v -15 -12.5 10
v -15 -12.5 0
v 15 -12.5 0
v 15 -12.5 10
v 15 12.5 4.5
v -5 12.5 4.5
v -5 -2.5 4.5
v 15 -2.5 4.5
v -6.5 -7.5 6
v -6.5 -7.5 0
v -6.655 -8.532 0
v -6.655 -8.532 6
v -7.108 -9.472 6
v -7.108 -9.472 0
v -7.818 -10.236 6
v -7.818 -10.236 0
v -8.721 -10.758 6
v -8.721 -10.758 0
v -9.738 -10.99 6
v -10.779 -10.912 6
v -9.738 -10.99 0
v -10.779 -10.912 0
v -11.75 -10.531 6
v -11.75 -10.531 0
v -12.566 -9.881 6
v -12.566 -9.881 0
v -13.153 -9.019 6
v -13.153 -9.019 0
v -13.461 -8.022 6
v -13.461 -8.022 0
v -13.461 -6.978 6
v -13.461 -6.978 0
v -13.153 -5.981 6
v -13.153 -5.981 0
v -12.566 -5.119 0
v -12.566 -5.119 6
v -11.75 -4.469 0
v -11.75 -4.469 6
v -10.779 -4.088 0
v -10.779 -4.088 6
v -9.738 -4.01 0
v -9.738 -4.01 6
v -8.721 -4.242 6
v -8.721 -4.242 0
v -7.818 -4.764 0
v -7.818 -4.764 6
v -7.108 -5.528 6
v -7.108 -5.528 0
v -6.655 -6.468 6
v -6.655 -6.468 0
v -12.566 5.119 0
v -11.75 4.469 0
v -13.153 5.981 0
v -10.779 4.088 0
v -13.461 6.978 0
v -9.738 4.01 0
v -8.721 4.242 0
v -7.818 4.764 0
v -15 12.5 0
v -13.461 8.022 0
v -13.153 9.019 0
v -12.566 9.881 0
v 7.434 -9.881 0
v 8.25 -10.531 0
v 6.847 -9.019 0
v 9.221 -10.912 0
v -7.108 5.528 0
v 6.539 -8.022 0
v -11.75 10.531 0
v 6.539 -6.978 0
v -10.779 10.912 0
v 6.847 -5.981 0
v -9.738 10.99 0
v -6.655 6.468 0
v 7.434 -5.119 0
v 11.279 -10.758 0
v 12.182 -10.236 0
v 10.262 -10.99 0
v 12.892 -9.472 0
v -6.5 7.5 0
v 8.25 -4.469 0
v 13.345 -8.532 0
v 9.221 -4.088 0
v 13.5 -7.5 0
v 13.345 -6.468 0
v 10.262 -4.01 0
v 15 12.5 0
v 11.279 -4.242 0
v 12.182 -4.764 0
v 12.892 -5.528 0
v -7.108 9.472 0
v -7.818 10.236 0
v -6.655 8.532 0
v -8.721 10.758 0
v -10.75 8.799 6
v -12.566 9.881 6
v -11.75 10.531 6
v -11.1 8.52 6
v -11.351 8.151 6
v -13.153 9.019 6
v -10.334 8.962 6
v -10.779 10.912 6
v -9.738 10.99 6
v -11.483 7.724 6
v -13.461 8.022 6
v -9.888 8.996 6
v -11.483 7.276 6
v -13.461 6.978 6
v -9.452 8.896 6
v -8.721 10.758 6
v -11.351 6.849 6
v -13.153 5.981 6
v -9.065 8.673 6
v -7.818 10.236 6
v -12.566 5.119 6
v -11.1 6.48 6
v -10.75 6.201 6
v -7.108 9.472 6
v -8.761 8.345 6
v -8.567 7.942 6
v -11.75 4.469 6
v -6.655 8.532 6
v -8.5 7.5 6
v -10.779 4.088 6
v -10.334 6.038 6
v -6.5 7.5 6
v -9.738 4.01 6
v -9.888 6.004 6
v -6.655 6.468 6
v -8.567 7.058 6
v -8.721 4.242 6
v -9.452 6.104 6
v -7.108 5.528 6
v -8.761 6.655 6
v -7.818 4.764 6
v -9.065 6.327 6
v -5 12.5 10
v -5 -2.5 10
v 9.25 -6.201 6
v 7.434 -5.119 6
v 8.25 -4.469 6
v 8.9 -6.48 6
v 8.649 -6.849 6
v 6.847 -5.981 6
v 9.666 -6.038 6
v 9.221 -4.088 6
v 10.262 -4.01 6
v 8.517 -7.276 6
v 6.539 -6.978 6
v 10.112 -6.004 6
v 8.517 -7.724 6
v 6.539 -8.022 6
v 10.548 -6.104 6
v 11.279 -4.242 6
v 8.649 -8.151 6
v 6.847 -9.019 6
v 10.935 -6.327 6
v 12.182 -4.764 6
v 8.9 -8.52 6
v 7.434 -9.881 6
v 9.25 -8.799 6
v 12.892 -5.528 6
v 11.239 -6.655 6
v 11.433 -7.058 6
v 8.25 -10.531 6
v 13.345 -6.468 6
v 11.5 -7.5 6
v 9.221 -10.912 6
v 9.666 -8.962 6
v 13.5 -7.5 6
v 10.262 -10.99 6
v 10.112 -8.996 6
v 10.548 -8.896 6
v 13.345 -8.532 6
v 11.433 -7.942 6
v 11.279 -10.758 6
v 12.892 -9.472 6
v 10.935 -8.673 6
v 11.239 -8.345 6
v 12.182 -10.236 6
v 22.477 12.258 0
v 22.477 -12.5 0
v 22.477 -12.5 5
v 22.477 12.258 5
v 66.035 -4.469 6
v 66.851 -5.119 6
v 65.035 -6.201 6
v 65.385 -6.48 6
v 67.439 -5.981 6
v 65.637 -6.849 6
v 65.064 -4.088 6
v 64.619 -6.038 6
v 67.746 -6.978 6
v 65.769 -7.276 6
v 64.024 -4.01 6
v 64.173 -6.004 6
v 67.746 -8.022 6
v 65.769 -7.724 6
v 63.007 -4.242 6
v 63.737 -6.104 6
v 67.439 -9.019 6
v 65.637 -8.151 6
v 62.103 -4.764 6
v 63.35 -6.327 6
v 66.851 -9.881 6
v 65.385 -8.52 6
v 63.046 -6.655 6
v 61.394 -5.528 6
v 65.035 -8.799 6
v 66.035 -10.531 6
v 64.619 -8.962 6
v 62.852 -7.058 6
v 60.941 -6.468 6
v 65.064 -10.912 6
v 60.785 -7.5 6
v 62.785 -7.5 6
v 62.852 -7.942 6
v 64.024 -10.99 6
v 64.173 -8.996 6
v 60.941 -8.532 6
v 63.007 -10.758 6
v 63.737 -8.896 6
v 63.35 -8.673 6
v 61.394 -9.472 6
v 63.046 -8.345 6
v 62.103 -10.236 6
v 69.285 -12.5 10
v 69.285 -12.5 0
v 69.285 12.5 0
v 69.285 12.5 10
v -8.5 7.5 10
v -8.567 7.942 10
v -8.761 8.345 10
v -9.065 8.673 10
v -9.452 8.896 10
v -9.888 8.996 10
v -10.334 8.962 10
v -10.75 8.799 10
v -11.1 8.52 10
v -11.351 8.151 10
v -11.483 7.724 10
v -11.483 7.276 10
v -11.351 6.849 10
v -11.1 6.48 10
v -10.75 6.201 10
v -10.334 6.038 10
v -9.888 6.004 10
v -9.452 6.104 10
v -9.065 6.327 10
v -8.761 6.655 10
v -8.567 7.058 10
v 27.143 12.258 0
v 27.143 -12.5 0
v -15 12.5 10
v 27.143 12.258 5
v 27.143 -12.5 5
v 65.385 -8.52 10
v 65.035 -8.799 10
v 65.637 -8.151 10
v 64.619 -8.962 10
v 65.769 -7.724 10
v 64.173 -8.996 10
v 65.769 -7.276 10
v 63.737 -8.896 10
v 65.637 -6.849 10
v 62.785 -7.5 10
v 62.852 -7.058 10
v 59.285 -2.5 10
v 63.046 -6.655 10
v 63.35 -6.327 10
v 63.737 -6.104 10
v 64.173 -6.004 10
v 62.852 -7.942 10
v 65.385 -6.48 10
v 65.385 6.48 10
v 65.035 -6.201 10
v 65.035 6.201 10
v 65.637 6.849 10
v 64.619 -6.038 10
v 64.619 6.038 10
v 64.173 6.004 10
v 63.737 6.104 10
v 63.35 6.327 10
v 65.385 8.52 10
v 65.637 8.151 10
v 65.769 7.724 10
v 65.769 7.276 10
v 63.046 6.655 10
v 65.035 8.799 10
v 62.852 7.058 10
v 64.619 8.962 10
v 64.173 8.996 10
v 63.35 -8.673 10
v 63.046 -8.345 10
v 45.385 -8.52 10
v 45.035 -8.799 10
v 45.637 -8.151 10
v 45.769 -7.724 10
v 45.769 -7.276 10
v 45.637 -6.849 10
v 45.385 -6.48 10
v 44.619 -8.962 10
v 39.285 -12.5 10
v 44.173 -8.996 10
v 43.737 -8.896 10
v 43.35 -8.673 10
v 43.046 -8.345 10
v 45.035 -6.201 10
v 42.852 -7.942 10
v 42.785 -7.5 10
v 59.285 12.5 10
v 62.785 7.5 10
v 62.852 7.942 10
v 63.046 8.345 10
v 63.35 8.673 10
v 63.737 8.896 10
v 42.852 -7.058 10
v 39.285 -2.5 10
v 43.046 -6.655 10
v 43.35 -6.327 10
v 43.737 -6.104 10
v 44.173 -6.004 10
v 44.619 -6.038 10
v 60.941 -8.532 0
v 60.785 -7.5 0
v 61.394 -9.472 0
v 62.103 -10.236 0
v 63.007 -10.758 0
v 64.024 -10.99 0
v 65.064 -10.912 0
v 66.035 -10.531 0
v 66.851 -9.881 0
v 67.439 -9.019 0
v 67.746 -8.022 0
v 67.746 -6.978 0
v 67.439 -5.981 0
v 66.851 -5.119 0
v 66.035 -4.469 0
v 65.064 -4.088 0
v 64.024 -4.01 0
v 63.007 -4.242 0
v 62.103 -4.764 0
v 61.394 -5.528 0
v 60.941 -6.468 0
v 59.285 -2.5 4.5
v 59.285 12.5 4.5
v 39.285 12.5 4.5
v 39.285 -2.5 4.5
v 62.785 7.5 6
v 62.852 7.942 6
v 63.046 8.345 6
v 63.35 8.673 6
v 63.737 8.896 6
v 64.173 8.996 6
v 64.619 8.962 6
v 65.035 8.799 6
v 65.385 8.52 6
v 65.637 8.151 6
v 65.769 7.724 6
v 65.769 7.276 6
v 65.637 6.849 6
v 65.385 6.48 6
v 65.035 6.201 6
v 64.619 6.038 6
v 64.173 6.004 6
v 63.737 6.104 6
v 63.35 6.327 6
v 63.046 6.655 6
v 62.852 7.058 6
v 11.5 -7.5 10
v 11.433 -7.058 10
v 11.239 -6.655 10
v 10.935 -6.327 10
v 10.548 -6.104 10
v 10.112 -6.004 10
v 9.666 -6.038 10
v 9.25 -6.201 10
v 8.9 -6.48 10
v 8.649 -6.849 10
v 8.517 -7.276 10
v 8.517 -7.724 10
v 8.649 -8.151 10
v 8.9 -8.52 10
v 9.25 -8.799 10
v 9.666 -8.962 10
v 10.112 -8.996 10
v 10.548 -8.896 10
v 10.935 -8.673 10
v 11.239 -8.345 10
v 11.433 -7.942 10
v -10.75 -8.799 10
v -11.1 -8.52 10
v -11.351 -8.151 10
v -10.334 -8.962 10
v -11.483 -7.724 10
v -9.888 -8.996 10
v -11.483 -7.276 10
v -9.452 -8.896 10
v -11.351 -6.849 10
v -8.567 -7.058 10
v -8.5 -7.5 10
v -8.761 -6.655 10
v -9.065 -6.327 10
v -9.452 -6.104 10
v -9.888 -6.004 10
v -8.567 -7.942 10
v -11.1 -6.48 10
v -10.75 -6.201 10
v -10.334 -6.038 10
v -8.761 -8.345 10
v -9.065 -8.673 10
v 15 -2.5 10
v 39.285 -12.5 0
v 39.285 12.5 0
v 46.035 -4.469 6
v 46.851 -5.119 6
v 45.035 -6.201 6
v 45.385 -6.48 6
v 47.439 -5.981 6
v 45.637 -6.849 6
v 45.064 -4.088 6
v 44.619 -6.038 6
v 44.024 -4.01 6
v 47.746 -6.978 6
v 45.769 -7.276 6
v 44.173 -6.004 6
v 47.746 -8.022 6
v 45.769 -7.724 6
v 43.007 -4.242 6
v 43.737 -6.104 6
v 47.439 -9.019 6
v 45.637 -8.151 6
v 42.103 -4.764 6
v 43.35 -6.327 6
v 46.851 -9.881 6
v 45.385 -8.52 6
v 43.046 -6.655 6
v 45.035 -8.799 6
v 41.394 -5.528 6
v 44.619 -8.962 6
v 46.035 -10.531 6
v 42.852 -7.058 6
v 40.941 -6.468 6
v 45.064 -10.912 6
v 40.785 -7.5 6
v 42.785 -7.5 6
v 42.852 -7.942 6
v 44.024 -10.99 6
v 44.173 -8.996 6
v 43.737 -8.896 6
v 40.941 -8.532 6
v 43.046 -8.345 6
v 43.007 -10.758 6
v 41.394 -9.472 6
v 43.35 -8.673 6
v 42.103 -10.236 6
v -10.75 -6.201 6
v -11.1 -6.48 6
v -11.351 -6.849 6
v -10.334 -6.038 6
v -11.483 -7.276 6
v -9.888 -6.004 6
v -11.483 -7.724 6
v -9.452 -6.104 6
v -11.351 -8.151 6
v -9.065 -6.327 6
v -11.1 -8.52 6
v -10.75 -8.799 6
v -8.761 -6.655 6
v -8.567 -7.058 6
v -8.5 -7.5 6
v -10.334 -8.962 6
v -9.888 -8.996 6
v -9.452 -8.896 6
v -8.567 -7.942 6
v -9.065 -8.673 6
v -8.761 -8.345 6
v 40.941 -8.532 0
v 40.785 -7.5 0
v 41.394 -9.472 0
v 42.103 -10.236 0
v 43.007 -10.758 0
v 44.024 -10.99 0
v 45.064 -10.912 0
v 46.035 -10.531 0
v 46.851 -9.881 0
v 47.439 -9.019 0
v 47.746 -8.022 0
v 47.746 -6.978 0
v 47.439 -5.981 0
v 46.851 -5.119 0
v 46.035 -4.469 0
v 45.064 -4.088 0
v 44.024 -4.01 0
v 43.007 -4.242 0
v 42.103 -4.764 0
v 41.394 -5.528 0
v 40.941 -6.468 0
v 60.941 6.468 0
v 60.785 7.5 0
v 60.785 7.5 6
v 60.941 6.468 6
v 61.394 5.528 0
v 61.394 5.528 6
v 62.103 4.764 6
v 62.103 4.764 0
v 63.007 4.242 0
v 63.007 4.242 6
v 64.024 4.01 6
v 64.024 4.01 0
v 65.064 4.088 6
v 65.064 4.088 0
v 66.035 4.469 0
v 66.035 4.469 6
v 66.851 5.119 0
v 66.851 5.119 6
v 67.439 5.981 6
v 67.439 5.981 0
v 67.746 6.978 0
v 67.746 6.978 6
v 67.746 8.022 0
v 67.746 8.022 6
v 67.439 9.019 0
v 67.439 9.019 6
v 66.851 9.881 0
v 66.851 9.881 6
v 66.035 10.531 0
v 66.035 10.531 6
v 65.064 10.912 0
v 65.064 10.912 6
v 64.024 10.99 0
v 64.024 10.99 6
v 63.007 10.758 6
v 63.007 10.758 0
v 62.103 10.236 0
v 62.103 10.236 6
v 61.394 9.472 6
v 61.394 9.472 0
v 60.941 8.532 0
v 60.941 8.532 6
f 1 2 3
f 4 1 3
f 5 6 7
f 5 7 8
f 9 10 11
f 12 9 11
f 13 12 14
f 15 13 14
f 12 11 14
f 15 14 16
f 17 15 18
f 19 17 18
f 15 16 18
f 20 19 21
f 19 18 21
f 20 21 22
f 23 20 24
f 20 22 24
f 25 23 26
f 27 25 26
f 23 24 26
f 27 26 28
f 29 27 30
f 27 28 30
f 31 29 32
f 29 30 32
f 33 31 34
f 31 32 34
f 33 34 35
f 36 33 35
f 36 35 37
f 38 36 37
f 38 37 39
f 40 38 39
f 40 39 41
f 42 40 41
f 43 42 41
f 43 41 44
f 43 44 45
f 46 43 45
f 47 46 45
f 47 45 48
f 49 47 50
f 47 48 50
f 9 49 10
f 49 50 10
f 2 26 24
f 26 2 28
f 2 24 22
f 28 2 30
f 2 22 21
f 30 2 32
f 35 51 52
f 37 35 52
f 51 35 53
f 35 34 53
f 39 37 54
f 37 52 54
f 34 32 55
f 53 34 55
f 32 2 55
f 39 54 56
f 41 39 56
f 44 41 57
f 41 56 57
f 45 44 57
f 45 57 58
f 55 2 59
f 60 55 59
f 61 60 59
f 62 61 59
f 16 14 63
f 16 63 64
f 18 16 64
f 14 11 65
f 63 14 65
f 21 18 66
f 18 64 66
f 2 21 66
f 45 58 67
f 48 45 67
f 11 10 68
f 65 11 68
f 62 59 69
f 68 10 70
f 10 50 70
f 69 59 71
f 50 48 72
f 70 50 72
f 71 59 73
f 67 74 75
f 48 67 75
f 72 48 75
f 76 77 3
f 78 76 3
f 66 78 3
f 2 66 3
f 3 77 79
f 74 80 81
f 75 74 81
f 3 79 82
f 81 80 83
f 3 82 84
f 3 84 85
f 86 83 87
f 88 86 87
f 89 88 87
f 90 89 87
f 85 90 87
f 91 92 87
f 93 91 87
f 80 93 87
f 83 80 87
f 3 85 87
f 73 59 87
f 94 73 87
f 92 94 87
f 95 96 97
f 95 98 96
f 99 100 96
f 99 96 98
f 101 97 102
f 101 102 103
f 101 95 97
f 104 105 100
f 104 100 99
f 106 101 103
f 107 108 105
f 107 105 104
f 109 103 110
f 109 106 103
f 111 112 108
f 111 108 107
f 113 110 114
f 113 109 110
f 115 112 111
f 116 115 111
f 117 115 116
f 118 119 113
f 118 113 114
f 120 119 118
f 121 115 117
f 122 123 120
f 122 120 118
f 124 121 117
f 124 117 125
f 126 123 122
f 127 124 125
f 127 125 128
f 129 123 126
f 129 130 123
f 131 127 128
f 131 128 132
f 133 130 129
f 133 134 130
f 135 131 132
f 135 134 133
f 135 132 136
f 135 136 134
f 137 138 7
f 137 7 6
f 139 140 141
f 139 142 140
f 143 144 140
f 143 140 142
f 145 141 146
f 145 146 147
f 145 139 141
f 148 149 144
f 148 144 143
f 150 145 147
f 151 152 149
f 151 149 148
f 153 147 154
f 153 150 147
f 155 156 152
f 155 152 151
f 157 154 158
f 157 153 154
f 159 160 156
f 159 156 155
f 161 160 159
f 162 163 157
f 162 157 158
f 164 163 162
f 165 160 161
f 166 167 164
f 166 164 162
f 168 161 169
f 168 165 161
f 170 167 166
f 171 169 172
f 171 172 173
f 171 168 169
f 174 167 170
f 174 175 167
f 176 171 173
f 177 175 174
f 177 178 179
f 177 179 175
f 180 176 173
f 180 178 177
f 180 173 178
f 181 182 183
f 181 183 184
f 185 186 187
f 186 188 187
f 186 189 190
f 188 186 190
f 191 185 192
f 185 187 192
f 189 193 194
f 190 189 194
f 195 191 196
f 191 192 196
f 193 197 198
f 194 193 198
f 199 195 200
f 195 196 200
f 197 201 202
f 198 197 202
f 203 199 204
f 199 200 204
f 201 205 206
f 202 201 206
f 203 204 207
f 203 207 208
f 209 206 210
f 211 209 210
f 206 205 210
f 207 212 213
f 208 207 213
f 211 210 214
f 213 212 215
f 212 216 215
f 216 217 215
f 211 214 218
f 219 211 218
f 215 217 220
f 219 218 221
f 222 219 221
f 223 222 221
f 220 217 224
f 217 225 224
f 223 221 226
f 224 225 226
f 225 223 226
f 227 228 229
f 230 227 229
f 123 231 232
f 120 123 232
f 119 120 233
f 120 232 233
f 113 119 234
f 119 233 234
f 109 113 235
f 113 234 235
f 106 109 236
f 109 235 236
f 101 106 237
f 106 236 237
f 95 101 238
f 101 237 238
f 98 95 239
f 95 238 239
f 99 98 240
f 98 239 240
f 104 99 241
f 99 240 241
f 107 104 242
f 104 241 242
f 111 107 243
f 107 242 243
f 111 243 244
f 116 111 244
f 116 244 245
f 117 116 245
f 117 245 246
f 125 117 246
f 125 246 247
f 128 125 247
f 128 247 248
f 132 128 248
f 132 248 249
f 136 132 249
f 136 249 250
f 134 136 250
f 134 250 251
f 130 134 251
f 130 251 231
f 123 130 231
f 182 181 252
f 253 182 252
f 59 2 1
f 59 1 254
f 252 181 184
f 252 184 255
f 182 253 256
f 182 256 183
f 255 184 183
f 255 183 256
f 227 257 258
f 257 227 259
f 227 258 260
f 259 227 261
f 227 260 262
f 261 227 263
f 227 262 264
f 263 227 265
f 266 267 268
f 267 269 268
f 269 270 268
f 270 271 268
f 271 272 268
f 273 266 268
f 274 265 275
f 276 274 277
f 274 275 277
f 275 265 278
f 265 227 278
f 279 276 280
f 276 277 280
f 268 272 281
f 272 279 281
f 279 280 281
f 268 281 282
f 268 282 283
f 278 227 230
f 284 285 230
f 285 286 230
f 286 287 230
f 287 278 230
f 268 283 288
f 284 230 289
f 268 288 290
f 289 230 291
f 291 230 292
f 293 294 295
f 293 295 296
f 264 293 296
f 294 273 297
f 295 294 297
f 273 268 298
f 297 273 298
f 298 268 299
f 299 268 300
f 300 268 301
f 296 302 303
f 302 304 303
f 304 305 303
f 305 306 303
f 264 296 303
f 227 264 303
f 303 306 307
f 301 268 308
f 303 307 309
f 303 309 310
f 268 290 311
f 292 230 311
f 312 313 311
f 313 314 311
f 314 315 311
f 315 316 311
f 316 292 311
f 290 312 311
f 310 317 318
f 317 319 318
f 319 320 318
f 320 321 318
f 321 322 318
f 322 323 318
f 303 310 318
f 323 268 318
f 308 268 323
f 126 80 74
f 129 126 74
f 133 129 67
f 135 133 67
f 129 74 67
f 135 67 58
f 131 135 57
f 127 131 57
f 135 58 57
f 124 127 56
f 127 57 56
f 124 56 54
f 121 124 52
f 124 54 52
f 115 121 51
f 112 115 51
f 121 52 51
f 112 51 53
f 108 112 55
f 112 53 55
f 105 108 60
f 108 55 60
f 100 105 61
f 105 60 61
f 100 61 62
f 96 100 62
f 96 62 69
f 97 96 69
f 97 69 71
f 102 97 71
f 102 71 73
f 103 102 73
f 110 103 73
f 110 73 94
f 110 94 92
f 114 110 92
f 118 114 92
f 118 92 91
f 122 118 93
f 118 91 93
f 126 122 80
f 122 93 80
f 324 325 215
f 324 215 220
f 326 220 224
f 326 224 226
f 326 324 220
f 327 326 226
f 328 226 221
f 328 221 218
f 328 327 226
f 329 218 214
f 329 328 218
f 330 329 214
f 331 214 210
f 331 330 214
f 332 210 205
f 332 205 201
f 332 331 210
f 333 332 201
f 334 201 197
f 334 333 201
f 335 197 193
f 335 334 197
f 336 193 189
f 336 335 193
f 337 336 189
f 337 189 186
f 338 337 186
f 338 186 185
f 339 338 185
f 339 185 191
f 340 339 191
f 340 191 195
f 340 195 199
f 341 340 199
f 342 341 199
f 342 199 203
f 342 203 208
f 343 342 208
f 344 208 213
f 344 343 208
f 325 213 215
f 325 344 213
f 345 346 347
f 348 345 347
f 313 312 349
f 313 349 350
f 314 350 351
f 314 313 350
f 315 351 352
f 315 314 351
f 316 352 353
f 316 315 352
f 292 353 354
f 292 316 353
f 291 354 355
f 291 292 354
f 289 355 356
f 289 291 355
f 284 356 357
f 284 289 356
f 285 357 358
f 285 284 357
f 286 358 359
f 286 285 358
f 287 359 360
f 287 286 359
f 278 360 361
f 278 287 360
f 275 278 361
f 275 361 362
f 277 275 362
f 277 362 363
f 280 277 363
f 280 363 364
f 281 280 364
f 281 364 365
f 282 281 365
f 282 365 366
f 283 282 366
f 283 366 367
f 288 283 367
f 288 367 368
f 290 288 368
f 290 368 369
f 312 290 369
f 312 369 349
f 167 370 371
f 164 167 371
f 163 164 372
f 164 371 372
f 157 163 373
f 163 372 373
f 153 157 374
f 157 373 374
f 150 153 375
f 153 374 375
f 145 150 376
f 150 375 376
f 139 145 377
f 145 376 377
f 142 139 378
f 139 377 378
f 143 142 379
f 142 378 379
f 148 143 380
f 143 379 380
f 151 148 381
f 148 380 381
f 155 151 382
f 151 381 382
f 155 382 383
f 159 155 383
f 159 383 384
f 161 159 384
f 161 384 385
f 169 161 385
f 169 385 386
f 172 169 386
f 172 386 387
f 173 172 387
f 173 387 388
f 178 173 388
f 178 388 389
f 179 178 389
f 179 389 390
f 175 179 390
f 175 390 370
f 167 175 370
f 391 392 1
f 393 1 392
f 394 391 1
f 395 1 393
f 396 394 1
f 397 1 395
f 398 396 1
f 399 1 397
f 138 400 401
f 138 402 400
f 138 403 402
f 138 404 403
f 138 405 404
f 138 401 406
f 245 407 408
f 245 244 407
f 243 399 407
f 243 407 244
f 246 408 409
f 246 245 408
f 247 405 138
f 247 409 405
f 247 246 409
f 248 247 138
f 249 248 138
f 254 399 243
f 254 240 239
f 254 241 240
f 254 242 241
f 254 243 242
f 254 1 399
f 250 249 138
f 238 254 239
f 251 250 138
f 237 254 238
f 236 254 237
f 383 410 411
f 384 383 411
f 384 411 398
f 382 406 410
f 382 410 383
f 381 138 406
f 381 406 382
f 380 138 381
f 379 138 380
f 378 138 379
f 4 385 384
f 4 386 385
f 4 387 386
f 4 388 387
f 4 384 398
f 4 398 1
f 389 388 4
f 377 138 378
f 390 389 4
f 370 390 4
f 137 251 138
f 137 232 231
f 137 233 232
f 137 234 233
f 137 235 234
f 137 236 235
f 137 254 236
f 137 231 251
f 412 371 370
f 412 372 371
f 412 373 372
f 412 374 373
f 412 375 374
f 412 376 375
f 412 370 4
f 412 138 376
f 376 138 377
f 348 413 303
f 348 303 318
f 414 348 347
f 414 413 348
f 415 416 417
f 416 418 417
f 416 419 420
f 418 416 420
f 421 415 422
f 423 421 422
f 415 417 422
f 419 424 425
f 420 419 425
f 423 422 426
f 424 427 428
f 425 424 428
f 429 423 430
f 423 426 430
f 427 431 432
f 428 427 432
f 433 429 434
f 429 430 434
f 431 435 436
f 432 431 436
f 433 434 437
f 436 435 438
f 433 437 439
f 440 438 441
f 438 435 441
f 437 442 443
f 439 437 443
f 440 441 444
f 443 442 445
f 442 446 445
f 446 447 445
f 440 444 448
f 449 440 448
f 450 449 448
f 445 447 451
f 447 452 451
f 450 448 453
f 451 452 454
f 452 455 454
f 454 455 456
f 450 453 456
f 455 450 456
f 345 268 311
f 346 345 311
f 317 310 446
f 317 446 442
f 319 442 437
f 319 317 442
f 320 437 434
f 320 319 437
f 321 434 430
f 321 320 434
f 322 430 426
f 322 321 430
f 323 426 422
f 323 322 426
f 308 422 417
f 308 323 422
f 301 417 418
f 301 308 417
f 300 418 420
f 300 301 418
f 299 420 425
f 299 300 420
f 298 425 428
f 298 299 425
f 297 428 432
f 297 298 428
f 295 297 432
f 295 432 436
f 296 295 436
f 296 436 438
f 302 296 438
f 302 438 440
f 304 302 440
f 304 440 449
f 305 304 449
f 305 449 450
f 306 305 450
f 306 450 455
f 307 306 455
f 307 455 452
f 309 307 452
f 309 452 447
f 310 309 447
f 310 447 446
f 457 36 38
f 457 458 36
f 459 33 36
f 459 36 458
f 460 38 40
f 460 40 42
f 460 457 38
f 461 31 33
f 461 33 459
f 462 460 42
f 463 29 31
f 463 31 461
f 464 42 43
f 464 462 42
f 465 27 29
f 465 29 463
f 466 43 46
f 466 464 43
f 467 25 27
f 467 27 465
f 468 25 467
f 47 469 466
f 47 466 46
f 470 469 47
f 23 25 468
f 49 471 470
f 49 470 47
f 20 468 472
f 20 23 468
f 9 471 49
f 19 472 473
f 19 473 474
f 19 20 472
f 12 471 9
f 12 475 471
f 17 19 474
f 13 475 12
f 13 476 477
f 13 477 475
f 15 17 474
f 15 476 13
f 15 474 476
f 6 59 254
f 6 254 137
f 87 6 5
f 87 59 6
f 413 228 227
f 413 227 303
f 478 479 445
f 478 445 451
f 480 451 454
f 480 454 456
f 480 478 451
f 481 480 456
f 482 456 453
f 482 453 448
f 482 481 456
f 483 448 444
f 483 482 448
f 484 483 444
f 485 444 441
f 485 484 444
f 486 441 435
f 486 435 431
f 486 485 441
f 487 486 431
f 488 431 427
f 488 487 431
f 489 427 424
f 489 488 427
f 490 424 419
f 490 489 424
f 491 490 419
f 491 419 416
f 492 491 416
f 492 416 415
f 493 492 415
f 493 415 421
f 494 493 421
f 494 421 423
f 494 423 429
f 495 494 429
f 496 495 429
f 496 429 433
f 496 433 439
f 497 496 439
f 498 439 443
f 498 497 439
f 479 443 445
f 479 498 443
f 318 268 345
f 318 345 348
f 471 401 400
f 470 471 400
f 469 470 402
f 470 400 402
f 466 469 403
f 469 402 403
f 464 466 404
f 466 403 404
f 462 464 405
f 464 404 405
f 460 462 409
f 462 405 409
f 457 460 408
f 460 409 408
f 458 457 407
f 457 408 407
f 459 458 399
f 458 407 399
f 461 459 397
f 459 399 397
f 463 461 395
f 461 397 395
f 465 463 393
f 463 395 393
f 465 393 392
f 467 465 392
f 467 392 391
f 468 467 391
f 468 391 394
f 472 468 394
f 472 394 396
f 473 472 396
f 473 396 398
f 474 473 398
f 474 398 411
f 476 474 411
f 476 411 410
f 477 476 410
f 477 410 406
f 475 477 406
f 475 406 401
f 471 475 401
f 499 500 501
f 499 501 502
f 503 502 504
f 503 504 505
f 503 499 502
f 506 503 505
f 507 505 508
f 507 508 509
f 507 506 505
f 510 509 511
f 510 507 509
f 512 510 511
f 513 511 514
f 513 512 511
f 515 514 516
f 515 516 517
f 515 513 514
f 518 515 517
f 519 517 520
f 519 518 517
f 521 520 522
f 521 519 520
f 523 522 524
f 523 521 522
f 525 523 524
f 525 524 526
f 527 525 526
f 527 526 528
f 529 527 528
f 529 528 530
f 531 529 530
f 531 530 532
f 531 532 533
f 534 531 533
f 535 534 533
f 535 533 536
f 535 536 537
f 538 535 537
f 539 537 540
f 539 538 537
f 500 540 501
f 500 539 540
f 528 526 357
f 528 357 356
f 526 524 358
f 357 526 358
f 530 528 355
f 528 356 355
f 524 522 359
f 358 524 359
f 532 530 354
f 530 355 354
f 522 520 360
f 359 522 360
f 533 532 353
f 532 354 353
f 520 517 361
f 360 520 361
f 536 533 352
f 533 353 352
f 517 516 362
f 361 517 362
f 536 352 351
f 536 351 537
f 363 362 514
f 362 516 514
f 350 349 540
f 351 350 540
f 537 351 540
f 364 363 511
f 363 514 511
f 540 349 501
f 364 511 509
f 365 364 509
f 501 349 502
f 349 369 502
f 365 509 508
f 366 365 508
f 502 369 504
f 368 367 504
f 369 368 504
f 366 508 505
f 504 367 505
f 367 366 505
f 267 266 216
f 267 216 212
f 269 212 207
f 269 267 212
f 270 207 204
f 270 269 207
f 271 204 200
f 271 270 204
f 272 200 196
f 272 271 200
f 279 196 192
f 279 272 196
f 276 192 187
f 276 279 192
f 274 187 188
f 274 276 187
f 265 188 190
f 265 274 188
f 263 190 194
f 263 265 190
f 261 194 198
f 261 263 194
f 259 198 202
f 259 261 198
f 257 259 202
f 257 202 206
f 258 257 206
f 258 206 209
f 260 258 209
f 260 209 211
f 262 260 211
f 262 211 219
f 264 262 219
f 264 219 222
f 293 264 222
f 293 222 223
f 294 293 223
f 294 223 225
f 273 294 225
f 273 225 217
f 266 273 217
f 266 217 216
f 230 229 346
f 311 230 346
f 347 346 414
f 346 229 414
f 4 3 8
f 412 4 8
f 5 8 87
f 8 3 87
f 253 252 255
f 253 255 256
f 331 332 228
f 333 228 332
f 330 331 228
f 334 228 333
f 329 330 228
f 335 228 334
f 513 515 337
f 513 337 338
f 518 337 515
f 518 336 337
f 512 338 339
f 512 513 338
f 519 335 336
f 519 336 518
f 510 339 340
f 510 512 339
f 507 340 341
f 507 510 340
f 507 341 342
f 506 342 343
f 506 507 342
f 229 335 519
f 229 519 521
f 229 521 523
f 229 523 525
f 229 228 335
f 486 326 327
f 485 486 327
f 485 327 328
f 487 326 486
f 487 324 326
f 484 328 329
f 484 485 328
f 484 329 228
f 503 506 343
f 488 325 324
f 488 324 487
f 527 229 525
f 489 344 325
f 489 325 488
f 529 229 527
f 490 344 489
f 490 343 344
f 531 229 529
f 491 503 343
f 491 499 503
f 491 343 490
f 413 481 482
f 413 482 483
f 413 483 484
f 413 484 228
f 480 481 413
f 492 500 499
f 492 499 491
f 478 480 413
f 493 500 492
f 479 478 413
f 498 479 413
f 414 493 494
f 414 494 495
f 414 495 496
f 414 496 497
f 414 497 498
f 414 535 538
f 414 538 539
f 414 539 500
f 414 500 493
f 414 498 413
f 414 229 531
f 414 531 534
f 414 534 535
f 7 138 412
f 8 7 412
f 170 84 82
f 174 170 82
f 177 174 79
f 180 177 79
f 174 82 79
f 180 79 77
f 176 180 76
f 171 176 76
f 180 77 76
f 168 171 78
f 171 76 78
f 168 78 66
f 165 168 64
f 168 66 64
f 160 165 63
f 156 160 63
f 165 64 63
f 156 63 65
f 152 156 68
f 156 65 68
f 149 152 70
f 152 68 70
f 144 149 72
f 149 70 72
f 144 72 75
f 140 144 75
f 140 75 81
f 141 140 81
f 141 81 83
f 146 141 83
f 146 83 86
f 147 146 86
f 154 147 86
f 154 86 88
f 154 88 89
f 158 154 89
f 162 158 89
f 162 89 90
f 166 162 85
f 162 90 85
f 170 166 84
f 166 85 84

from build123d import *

# Parameters (mm, degrees)
F0_W     = 30
F0_H     = 25
F1_DEPTH = 10
F2_W     = 20
F2_H     = 15
F3_DEPTH = 5.5
F4_R     = 1.5
F5_DEPTH = 25
F6_R     = 3.5
F7_DEPTH = 6
F9_DEPTH = 5


with BuildPart() as f1:
    # F0 (on Top) → F1 (new body)
    with BuildSketch(Plane.XY):
        Rectangle(F0_W, F0_H)
    extrude(amount=F1_DEPTH)

    # F2 (on face) → F3 (cut)
    with BuildSketch(Plane.XY.offset(10)):
        with Locations((5, 5)):
            Rectangle(F2_W, F2_H)
    extrude(amount=-F3_DEPTH, mode=Mode.SUBTRACT)

    # F4 (on face) → F5 (cut)
    with BuildSketch(Plane.XY.offset(10)):
        with Locations((-10, 7.5)):
            Circle(F4_R)
        with Locations((10, -7.5)):
            Circle(F4_R)
        with Locations((-10, -7.5)):
            Circle(F4_R)
    extrude(amount=-F5_DEPTH, mode=Mode.SUBTRACT)

    # F6 (on face) → F7 (cut)
    with BuildSketch(Plane(origin=(0, 0, 0), x_dir=(1, 0, 0), z_dir=(0, 0, -1))):
        with Locations((-10, -7.5)):
            Circle(F6_R)
        with Locations((-10, 7.5)):
            Circle(F6_R)
        with Locations((10, 7.5)):
            Circle(F6_R)
    extrude(amount=-F7_DEPTH, mode=Mode.SUBTRACT)


with BuildPart() as f9:
    # F8 (on face) → F9 (new body)
    with BuildSketch(Plane(origin=(0, 0, 0), x_dir=(1, 0, 0), z_dir=(0, 0, -1))):
        Polygon((22.47723, 12.5), (22.47723, 0), (22.47723, -12.258405), (27.142728, -12.258405), (27.142728, 12.5), align=None)
    extrude(amount=-F9_DEPTH)


with BuildPart() as f10_1:
    # F10: instance of F1
    add(f1.part.mirror(Plane(origin=(27.142728, -0.120798, 2.5), x_dir=(0, 1, 0), z_dir=(1, 0, 0))))


solid = Compound([f1.part, f9.part, f10_1.part])
